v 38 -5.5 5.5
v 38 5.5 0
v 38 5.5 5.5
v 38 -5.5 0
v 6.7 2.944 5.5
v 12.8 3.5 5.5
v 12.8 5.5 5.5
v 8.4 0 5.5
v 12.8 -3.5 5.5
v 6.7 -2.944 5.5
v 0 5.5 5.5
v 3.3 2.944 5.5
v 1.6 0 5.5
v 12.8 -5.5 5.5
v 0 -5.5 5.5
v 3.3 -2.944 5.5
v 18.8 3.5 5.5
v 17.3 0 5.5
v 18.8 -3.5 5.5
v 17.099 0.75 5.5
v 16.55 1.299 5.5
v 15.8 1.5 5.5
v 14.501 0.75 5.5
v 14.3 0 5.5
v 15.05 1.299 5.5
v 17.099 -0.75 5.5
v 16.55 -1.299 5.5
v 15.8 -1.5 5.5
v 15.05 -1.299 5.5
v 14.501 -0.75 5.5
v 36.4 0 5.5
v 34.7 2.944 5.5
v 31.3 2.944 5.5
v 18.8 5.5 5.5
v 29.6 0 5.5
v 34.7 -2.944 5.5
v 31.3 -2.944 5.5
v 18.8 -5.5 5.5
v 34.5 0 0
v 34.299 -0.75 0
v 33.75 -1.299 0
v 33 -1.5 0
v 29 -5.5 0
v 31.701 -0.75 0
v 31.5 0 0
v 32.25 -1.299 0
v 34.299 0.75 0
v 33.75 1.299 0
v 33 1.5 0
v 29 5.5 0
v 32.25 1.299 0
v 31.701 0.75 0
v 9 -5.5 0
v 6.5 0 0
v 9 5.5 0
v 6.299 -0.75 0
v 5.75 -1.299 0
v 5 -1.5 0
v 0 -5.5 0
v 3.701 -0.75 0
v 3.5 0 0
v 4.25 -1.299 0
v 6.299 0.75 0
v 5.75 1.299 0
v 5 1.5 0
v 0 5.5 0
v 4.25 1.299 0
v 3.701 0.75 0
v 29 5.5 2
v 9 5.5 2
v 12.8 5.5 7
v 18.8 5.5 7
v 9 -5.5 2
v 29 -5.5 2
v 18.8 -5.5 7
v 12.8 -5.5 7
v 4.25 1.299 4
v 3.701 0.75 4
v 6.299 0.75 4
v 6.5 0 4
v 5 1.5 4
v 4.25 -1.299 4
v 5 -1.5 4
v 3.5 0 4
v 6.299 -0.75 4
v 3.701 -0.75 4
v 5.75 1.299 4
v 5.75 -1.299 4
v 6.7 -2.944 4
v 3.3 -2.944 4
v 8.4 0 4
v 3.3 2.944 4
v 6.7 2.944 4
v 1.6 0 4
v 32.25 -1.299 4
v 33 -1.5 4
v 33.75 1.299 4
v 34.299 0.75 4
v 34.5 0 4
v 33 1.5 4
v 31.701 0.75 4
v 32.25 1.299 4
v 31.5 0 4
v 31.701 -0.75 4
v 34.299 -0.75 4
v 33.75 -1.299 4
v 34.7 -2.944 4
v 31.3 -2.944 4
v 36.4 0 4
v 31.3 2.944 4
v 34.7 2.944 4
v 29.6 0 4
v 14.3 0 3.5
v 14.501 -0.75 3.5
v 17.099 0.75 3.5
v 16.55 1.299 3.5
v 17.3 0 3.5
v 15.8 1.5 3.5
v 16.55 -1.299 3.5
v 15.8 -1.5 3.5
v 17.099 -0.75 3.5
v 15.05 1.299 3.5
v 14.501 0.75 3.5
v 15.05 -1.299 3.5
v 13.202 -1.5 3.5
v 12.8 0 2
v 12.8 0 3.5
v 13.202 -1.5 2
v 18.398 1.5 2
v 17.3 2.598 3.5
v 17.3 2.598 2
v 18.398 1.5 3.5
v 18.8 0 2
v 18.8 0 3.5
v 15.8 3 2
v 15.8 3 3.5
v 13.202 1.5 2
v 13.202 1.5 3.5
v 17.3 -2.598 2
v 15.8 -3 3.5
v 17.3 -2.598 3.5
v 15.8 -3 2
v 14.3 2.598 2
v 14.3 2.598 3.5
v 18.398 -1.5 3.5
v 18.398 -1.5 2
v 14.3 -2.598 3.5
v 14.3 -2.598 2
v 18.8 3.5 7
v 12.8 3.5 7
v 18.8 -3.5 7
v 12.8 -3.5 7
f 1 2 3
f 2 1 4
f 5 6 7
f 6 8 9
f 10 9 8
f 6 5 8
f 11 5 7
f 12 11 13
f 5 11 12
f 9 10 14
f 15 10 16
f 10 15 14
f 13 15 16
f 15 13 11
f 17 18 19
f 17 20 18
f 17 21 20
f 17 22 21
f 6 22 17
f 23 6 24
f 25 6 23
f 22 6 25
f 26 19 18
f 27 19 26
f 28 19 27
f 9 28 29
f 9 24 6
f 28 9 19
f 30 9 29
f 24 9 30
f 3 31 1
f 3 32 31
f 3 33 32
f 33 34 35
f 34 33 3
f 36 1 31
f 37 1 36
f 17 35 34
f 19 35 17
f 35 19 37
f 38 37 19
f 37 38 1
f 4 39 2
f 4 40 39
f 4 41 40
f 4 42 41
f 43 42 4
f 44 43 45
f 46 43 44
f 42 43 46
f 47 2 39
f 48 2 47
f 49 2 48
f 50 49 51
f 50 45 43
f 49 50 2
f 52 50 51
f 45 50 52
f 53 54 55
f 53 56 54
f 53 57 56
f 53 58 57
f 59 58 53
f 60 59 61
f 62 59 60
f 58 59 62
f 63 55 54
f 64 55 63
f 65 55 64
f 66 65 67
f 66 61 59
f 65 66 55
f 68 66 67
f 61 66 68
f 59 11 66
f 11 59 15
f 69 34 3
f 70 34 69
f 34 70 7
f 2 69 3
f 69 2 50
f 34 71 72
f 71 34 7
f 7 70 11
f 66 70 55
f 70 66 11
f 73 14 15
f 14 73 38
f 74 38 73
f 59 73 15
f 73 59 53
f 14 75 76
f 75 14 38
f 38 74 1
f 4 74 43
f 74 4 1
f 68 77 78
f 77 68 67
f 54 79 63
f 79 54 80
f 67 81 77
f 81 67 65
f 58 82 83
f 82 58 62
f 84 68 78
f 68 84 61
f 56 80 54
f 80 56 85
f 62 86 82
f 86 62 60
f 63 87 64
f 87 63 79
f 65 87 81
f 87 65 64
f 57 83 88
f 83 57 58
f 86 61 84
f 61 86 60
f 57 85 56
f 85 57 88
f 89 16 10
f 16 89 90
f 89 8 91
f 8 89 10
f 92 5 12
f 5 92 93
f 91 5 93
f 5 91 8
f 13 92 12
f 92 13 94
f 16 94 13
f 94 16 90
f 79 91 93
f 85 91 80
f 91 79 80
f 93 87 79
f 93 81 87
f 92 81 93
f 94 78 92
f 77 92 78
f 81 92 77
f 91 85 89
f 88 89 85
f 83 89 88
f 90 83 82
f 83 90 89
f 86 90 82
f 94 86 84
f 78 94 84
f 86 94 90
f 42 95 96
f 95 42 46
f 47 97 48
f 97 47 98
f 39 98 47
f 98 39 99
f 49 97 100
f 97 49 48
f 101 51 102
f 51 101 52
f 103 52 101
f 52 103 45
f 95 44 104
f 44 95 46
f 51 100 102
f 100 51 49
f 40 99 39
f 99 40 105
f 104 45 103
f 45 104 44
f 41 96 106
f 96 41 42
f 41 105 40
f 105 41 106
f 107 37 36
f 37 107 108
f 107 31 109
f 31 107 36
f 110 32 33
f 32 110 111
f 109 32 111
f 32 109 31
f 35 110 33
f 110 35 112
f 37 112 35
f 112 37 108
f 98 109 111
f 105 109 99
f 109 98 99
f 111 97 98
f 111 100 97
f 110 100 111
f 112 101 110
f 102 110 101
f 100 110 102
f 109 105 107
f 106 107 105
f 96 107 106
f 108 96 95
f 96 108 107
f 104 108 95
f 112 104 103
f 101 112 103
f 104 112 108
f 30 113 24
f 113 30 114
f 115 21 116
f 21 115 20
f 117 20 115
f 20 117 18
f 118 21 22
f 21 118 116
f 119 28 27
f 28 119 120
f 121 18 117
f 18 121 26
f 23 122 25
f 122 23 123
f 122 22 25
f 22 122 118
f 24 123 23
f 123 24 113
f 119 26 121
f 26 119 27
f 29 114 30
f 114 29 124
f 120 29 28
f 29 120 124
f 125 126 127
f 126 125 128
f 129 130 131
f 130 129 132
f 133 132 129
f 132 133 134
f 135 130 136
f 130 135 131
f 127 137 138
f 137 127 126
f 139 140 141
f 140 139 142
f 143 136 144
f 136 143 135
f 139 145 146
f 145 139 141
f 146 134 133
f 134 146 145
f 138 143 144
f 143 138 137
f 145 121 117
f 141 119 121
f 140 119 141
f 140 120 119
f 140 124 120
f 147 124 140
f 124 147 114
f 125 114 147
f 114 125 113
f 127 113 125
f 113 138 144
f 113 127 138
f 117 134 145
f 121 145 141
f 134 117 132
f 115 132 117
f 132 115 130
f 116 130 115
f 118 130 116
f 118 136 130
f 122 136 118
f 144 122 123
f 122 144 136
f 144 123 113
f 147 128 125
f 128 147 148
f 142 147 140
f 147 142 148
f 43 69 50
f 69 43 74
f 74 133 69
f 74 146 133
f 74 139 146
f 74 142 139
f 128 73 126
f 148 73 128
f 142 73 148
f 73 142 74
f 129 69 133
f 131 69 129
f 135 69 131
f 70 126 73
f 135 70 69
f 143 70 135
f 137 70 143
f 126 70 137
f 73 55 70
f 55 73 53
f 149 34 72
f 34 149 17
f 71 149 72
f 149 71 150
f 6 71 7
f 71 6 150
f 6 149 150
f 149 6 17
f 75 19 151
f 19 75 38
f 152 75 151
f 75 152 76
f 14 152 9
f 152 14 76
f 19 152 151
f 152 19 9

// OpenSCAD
W_BD = 10.8;
W_DF = 17.2;
W_BF = W_BD + W_DF;
echo(W_BF=W_BF);

W_AB = 5;
W_BC = 4;

W_AC = W_AB + W_BC;
W_AD = W_AB + W_BD;
W_AF = W_AB + W_BF;
W_CE = W_BF - W_BC * 2;
echo(W_CE=W_CE);

W = W_BF + 2 * W_AB;
echo(W=W);

H = 11;
D = 5.5;

D_M3 = 6.8;  


module hole(h, d, x_offset, z_offset=0, fn=12) {
    translate([x_offset, 0, z_offset]) cylinder(h=h, d=d, $fn=fn);    
}

module bump(x, y, z) {
    color("red")
        translate([x, y-1, z+1.5/2])
            cube([6, 2, 1.5], center=true);
}

difference() {
    translate([0, -H/2, 0]) cube([W, H, D]);
    hole(D, 3, W_AB);
    hole(D, D_M3, W_AB, 4, 6);
    hole(D, 3, W_AF);
    hole(D, D_M3, W_AF, 4, 6);
    hole(D, 3, W_AD);
    hole(3.5, 6, W_AD);
    translate([W_AC, -H/2, 0]) cube([W_CE, H, 2]);
}

bump(W_AD, H/2, D);
mirror([0,1,0]) bump(W_AD, H/2, D);
